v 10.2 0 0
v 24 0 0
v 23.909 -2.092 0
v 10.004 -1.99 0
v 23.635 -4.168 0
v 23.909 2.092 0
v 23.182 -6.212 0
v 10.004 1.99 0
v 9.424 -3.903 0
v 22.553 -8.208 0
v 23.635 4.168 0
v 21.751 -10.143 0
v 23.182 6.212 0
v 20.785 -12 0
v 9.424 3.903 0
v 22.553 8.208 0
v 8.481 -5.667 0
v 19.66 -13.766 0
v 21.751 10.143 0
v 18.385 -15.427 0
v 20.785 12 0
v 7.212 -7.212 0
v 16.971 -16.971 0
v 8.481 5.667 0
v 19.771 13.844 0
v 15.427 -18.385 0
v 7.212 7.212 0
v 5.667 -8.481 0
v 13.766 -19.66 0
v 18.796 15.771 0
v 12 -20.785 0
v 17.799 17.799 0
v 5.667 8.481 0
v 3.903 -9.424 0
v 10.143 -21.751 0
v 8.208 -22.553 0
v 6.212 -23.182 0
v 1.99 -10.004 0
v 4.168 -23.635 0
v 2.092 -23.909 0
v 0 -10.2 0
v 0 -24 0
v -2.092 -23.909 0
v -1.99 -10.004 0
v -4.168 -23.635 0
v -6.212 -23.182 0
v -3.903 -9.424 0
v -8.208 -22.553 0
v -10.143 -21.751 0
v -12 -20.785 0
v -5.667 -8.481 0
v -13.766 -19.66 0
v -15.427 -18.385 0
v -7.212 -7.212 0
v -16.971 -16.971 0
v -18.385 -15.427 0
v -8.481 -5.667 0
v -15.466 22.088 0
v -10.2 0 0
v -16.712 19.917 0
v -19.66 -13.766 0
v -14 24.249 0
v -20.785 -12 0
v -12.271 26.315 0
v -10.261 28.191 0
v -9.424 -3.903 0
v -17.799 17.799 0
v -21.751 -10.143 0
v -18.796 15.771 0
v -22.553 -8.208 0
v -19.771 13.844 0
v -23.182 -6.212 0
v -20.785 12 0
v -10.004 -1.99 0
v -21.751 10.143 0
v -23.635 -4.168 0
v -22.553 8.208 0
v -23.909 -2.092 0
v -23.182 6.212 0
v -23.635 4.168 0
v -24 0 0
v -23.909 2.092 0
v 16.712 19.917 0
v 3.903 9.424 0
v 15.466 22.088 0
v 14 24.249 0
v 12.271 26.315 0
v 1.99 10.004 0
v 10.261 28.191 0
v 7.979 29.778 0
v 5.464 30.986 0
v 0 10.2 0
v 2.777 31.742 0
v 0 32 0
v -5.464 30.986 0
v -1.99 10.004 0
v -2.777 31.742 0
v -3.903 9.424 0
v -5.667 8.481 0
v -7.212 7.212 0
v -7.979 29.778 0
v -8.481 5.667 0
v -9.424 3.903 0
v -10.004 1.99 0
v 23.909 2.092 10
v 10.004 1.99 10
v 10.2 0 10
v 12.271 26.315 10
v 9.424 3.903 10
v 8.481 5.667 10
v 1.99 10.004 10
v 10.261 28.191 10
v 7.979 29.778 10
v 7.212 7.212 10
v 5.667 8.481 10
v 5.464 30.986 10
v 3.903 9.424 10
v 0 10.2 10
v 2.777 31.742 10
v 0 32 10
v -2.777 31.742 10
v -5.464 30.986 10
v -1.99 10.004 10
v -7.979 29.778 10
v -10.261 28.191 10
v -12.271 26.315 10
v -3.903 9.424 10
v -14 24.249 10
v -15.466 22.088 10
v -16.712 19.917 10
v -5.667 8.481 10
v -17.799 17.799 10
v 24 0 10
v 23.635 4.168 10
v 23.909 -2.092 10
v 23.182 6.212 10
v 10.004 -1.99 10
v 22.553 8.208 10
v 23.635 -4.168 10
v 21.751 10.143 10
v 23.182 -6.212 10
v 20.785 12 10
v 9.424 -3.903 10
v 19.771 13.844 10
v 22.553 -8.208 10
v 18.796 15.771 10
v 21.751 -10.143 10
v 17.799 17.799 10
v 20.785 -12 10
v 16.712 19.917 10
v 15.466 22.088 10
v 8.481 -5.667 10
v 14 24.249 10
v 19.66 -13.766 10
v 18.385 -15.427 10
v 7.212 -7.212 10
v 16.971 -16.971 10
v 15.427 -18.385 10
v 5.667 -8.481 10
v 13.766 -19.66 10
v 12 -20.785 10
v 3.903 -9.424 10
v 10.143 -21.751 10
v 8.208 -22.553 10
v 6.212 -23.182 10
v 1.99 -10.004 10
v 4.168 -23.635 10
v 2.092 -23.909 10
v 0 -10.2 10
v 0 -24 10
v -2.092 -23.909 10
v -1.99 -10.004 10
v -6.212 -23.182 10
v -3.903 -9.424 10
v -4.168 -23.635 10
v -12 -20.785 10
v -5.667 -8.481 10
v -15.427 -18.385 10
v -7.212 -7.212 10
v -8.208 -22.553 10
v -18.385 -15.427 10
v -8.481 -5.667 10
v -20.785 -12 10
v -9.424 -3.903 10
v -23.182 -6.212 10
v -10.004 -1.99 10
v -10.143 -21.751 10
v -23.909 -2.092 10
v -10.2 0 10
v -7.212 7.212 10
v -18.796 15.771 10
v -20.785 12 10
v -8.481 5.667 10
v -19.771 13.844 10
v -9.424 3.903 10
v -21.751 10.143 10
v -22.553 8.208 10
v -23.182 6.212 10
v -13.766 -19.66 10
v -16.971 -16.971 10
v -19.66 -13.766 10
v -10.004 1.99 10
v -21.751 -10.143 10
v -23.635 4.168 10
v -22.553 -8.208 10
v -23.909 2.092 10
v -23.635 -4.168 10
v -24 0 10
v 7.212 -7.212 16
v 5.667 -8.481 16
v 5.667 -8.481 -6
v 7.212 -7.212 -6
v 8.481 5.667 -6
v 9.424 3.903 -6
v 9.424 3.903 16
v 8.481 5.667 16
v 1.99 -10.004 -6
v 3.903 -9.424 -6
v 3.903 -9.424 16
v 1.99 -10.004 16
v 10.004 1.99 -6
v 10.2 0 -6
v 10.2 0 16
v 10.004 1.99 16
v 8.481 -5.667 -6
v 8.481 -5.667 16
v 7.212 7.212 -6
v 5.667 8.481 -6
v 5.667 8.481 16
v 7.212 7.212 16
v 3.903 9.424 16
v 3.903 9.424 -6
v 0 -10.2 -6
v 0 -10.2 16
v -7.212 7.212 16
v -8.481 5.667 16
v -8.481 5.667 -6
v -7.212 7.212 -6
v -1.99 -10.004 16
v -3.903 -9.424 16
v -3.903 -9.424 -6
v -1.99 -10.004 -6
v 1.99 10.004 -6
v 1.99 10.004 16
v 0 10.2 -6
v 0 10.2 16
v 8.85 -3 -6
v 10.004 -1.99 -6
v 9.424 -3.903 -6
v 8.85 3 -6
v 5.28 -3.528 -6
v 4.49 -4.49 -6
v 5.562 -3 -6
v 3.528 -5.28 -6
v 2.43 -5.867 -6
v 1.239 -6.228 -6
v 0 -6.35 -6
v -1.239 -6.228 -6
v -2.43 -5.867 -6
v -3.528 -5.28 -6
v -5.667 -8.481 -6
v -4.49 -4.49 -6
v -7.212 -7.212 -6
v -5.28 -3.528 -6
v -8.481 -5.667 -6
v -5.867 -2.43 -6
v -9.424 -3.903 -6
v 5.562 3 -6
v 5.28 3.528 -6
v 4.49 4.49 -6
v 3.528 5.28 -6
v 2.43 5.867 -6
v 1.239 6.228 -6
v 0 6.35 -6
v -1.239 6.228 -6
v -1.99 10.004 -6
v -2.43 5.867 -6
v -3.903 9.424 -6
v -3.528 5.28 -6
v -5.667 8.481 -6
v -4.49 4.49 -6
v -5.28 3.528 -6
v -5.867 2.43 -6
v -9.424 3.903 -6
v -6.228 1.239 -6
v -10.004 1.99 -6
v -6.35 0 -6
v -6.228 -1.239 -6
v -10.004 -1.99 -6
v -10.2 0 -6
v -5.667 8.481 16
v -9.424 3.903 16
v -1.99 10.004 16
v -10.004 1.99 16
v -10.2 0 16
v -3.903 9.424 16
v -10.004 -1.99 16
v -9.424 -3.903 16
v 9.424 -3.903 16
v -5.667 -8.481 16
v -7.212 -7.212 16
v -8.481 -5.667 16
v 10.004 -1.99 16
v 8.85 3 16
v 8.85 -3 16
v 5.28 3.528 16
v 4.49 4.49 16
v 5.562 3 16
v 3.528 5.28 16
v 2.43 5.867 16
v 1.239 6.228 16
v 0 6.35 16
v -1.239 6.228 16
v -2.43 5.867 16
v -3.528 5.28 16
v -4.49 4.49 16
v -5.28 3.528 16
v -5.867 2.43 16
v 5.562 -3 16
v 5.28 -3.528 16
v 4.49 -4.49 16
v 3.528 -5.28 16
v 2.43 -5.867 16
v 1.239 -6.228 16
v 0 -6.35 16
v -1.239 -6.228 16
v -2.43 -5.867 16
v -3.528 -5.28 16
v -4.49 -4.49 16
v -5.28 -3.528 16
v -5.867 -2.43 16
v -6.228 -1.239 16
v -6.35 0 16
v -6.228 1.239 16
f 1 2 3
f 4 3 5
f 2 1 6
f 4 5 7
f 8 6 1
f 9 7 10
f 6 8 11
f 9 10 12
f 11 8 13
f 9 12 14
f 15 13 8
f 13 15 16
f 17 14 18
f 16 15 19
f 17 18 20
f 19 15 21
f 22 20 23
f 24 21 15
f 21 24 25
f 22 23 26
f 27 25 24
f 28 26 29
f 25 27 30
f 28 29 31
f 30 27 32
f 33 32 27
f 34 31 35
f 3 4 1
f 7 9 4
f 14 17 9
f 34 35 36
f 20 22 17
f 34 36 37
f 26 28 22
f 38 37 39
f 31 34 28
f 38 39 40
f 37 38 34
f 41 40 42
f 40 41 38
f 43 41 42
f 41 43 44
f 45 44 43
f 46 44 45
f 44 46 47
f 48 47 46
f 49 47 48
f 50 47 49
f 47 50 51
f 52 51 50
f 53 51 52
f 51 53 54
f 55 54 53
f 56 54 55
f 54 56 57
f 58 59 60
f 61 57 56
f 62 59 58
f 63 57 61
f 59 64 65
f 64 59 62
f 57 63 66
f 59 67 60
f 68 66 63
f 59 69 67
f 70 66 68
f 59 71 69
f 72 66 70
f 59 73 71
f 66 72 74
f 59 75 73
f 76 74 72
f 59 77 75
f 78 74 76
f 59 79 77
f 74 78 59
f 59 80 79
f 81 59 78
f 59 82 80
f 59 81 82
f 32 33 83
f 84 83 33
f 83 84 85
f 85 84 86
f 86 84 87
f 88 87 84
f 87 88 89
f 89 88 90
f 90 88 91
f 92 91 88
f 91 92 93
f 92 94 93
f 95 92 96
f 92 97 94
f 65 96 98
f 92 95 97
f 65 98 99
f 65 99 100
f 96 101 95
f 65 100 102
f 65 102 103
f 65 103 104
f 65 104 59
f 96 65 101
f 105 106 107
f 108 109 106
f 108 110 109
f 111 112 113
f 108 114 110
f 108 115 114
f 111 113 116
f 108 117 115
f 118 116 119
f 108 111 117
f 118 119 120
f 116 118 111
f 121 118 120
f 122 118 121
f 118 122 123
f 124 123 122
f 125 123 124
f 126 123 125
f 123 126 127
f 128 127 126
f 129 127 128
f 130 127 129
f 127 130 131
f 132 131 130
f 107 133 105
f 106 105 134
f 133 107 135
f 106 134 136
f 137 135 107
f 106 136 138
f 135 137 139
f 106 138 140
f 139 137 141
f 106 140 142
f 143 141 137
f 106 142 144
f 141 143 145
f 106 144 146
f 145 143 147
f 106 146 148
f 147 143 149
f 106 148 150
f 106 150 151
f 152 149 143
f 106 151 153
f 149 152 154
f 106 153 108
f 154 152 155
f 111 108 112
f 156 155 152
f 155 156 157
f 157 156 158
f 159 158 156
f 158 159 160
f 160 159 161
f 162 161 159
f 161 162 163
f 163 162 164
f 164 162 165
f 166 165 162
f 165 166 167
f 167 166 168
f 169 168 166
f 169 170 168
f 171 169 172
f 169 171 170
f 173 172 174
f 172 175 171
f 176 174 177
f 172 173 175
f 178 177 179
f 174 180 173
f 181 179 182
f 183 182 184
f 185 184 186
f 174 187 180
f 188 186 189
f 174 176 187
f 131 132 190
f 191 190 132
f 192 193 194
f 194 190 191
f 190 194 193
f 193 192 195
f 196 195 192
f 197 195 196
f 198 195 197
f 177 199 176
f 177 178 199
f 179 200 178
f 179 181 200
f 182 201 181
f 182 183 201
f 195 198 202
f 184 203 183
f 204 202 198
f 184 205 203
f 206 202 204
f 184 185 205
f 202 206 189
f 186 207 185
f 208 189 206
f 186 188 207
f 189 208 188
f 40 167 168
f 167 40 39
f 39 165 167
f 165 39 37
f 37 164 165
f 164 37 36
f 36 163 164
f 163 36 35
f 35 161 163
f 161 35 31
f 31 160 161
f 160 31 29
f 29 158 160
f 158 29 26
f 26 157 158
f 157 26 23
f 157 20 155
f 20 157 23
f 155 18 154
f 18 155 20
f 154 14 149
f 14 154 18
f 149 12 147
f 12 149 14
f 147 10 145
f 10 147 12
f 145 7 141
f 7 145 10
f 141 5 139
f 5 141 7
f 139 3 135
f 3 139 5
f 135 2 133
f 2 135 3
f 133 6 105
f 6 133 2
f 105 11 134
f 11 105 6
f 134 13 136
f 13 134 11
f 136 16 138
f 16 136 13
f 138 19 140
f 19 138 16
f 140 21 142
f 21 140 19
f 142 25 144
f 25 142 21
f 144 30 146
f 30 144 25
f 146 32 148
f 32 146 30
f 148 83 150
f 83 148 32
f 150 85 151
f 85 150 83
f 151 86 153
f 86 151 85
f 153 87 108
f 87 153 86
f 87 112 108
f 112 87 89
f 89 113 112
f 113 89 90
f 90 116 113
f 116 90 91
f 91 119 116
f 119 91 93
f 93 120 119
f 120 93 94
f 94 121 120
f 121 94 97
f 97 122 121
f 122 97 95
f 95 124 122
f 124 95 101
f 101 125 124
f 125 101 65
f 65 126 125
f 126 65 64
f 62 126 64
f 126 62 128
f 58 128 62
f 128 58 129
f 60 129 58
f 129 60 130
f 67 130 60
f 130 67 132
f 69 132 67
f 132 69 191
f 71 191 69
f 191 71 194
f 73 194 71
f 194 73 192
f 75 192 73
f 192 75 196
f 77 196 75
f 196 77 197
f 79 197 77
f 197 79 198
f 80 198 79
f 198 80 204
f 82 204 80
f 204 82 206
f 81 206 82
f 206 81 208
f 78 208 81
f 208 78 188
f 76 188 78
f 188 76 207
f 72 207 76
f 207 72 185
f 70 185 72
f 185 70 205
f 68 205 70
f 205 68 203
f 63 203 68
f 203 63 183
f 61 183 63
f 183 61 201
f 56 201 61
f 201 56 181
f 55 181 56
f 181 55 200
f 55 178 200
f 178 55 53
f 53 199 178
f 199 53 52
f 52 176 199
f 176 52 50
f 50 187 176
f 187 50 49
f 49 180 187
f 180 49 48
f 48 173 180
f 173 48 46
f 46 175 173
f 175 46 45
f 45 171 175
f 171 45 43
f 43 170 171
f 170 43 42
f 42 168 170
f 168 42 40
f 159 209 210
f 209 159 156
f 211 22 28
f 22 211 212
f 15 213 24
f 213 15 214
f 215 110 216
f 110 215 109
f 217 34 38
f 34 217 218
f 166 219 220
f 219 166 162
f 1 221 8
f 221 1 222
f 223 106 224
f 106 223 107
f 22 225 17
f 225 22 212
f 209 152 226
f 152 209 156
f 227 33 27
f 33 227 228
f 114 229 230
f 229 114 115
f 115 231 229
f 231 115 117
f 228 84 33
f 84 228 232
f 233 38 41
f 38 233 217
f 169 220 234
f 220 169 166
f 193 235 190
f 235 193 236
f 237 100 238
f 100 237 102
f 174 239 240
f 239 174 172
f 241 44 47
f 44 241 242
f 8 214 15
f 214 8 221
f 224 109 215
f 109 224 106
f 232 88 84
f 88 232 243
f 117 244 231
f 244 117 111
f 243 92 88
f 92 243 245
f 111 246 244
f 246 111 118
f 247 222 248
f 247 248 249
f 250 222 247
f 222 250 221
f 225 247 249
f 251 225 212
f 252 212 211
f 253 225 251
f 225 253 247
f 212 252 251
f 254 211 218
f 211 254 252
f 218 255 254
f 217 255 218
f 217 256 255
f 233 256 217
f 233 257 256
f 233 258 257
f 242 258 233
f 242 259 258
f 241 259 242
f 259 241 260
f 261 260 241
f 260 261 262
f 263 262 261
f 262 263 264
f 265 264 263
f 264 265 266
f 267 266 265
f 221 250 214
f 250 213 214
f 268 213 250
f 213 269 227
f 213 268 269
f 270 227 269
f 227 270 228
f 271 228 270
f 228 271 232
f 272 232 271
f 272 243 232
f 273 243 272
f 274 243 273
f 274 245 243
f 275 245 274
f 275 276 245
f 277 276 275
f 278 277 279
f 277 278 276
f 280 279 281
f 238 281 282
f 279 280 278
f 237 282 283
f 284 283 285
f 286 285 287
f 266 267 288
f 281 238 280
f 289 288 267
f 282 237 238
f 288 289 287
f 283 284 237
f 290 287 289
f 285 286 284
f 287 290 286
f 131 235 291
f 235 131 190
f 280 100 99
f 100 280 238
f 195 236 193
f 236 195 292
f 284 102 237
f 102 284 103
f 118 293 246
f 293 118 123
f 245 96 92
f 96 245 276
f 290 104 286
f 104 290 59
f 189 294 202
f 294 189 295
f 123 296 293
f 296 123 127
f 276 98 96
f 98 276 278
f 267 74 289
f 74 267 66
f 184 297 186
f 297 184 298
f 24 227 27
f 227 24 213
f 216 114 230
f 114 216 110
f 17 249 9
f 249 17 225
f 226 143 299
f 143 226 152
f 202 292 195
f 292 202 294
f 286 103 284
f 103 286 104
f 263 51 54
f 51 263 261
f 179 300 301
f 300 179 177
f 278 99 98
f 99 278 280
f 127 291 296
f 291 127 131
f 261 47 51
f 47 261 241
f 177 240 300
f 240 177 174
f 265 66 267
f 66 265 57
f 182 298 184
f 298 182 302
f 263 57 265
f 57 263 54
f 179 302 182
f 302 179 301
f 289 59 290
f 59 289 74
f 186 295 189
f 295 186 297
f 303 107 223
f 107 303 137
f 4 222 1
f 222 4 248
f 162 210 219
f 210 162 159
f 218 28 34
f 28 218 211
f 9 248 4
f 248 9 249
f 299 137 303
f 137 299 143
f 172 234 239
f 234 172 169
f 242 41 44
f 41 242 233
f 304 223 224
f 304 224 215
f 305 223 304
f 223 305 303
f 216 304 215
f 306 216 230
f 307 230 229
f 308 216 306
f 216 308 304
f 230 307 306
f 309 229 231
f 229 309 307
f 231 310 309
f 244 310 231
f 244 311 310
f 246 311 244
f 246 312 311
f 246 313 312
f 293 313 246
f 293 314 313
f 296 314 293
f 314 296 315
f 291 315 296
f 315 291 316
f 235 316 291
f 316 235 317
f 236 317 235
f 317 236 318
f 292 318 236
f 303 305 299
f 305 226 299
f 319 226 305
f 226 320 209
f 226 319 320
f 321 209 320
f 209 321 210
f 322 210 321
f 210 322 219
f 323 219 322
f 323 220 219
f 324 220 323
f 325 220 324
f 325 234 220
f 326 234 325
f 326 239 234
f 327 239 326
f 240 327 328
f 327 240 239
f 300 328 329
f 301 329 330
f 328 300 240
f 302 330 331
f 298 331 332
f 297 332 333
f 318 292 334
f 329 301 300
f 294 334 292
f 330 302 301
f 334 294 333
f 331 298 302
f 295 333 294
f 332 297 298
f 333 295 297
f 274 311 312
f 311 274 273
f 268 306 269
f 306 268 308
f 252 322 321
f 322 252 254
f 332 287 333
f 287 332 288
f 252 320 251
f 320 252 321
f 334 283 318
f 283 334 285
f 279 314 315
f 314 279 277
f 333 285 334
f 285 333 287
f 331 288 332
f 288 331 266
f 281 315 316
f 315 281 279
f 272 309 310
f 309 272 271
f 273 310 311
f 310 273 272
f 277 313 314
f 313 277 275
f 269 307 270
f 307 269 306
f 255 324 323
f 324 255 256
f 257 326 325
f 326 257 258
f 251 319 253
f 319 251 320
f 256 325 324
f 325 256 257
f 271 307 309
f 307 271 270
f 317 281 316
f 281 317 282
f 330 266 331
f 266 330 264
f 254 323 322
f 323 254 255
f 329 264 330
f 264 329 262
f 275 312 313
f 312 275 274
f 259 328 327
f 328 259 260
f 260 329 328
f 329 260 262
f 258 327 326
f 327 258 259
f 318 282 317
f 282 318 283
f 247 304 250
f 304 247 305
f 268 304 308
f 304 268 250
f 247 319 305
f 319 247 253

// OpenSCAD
$fn = 32;

// ----------------------------------------------------------------------
// Cam: base radius 24 mm with a 8 mm lift over 120 degrees
// ----------------------------------------------------------------------

// --- parameters (mm) ---
base_r = 24;              // base radius
lift = 8;                 // lift height above the base radius
lift_span = 120;          // angular width of the lift
lift_start = 30;          // angle where the lift starts
cam_t = 10;               // cam plate thickness
hub_d = 20.4;             // hub diameter
hub_h = 22;               // hub height
bore_d = 12.7;            // bore
key_w = 6;                // keyway width
key_depth = 1.85;         // keyway depth

cam_profile = [[24, 0], [23.909, 2.092], [23.635, 4.168], [23.182, 6.212], [22.553, 8.208], [21.751, 10.143], [20.785, 12], [19.771, 13.844], [18.796, 15.771], [17.799, 17.799], [16.712, 19.917], [15.466, 22.088], [14, 24.249], [12.271, 26.315], [10.261, 28.191], [7.979, 29.778], [5.464, 30.986], [2.777, 31.742], [0, 32], [-2.777, 31.742], [-5.464, 30.986], [-7.979, 29.778], [-10.261, 28.191], [-12.271, 26.315], [-14, 24.249], [-15.466, 22.088], [-16.712, 19.917], [-17.799, 17.799], [-18.796, 15.771], [-19.771, 13.844], [-20.785, 12], [-21.751, 10.143], [-22.553, 8.208], [-23.182, 6.212], [-23.635, 4.168], [-23.909, 2.092], [-24, 0], [-23.909, -2.092], [-23.635, -4.168], [-23.182, -6.212], [-22.553, -8.208], [-21.751, -10.143], [-20.785, -12], [-19.66, -13.766], [-18.385, -15.427], [-16.971, -16.971], [-15.427, -18.385], [-13.766, -19.66], [-12, -20.785], [-10.143, -21.751], [-8.208, -22.553], [-6.212, -23.182], [-4.168, -23.635], [-2.092, -23.909], [0, -24], [2.092, -23.909], [4.168, -23.635], [6.212, -23.182], [8.208, -22.553], [10.143, -21.751], [12, -20.785], [13.766, -19.66], [15.427, -18.385], [16.971, -16.971], [18.385, -15.427], [19.66, -13.766], [20.785, -12], [21.751, -10.143], [22.553, -8.208], [23.182, -6.212], [23.635, -4.168], [23.909, -2.092]];

difference() {
  union() {
    linear_extrude(height = cam_t) polygon(cam_profile);
    /* hub, proud of the cam plate on both sides */
    translate([0, 0, -6]) cylinder(h = hub_h, d = hub_d);
  }
  /* bore through the hub, 2.5 mm clear on both faces */
  translate([0, 0, -8.5]) cylinder(h = hub_h + 5, d = bore_d);
  /* keyway, milled through the whole hub */
  translate([4.5, -3, -8.5]) cube([4.35, 6, 27]);
}
